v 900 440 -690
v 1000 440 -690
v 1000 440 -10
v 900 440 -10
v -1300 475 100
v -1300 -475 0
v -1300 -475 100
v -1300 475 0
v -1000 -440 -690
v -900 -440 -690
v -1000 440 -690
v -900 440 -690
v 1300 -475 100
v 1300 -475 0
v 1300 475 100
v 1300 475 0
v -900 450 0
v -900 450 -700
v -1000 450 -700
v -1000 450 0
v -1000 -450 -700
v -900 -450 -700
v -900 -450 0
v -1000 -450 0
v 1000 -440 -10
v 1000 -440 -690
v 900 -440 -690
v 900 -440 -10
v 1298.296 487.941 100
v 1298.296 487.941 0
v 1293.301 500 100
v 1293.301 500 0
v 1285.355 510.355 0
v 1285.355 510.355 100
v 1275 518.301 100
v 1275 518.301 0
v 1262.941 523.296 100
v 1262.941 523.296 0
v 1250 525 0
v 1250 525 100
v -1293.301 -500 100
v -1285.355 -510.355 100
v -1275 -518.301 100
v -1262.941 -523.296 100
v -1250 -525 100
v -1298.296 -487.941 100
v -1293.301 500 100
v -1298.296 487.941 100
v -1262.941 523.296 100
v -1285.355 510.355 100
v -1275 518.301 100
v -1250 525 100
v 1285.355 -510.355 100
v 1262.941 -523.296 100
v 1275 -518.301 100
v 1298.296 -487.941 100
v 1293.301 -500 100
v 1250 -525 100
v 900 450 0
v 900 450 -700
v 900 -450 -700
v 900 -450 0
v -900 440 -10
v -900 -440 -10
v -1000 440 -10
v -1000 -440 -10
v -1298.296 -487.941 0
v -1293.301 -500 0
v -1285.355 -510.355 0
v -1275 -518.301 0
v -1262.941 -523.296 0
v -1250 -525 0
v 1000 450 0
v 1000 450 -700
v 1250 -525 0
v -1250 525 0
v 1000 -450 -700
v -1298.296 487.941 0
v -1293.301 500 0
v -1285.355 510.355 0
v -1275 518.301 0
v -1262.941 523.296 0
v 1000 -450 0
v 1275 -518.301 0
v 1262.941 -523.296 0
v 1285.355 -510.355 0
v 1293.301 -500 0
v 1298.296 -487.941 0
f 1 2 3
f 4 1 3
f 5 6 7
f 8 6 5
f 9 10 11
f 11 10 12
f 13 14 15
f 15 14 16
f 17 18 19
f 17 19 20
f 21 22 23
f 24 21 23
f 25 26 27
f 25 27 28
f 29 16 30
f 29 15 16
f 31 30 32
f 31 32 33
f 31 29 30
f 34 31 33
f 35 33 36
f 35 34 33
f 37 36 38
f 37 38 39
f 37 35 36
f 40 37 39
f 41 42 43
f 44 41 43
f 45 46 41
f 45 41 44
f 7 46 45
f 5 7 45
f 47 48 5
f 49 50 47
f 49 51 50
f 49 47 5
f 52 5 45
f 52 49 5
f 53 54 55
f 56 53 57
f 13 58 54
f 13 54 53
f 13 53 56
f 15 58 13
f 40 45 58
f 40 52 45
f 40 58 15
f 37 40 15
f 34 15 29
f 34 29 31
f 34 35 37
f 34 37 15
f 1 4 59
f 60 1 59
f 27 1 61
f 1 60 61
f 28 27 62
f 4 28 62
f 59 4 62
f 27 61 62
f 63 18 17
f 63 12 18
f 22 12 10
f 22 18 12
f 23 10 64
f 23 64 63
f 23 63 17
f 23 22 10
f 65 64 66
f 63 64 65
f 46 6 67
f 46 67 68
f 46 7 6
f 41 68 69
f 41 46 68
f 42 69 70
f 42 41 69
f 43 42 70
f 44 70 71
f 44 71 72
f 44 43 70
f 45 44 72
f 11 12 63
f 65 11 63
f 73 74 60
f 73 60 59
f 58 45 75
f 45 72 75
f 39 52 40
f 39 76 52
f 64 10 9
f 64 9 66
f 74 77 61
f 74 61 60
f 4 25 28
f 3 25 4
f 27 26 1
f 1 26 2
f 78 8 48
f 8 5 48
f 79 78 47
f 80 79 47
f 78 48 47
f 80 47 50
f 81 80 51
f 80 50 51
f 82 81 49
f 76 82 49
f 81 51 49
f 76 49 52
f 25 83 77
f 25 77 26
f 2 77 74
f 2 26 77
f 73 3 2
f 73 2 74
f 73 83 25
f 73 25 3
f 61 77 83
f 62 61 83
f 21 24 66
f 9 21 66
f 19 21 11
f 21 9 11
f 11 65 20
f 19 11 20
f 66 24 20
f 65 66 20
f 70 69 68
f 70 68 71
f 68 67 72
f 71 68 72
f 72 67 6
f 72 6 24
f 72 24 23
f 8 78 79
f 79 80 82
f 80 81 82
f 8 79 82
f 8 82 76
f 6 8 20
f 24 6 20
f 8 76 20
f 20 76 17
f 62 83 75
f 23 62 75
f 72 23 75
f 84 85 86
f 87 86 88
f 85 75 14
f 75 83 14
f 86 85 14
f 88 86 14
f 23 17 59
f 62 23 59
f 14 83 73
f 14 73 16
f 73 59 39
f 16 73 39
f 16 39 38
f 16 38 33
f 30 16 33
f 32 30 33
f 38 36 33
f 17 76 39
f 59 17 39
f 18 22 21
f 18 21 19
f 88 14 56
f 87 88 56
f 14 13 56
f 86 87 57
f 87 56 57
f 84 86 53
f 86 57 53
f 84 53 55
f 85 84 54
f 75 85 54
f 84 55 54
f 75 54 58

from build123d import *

# Parameters (mm, degrees)
F0_W          = 2600
F0_H          = 1050
F1_DEPTH      = 100
F2_W          = 900
F2_H          = 700
F2_W_2        = 880
F2_H_2        = 680
F3_DEPTH      = 1000
F4_W          = 1800
F4_H          = 700
F5_DEPTH      = 525.001
F5_DEPTH_BACK = 525.001
F6_R          = 50


with BuildPart() as f1:
    # F0 (on Top) → F1 (new body)
    with BuildSketch(Plane.XY):
        Rectangle(F0_W, F0_H)
    extrude(amount=F1_DEPTH)

    # F2 (on Right) → F3 (join, symmetric)
    with BuildSketch(Plane.YZ):
        with Locations((0, -350)):
            Rectangle(F2_W, F2_H)
        with Locations((0, -350)):
            Rectangle(F2_W_2, F2_H_2, mode=Mode.SUBTRACT)
    extrude(amount=F3_DEPTH, both=True)

    # F4 (on Front) → F5 (cut, two sides)
    with BuildSketch(Plane.XZ) as f5_sk:
        with Locations((0, -350)):
            Rectangle(F4_W, F4_H)
    extrude(amount=-F5_DEPTH, mode=Mode.SUBTRACT)
    extrude(f5_sk.sketch, amount=F5_DEPTH_BACK, mode=Mode.SUBTRACT)

    # F6
    f6_edges = [f1.edges().sort_by_distance(p)[0] for p in [
        (1300, -525, 50),
        (1300, 525, 50),
        (-1300, 525, 50),
        (-1300, -525, 50),
    ]]
    fillet(f6_edges, radius=F6_R)


solid = f1.part
